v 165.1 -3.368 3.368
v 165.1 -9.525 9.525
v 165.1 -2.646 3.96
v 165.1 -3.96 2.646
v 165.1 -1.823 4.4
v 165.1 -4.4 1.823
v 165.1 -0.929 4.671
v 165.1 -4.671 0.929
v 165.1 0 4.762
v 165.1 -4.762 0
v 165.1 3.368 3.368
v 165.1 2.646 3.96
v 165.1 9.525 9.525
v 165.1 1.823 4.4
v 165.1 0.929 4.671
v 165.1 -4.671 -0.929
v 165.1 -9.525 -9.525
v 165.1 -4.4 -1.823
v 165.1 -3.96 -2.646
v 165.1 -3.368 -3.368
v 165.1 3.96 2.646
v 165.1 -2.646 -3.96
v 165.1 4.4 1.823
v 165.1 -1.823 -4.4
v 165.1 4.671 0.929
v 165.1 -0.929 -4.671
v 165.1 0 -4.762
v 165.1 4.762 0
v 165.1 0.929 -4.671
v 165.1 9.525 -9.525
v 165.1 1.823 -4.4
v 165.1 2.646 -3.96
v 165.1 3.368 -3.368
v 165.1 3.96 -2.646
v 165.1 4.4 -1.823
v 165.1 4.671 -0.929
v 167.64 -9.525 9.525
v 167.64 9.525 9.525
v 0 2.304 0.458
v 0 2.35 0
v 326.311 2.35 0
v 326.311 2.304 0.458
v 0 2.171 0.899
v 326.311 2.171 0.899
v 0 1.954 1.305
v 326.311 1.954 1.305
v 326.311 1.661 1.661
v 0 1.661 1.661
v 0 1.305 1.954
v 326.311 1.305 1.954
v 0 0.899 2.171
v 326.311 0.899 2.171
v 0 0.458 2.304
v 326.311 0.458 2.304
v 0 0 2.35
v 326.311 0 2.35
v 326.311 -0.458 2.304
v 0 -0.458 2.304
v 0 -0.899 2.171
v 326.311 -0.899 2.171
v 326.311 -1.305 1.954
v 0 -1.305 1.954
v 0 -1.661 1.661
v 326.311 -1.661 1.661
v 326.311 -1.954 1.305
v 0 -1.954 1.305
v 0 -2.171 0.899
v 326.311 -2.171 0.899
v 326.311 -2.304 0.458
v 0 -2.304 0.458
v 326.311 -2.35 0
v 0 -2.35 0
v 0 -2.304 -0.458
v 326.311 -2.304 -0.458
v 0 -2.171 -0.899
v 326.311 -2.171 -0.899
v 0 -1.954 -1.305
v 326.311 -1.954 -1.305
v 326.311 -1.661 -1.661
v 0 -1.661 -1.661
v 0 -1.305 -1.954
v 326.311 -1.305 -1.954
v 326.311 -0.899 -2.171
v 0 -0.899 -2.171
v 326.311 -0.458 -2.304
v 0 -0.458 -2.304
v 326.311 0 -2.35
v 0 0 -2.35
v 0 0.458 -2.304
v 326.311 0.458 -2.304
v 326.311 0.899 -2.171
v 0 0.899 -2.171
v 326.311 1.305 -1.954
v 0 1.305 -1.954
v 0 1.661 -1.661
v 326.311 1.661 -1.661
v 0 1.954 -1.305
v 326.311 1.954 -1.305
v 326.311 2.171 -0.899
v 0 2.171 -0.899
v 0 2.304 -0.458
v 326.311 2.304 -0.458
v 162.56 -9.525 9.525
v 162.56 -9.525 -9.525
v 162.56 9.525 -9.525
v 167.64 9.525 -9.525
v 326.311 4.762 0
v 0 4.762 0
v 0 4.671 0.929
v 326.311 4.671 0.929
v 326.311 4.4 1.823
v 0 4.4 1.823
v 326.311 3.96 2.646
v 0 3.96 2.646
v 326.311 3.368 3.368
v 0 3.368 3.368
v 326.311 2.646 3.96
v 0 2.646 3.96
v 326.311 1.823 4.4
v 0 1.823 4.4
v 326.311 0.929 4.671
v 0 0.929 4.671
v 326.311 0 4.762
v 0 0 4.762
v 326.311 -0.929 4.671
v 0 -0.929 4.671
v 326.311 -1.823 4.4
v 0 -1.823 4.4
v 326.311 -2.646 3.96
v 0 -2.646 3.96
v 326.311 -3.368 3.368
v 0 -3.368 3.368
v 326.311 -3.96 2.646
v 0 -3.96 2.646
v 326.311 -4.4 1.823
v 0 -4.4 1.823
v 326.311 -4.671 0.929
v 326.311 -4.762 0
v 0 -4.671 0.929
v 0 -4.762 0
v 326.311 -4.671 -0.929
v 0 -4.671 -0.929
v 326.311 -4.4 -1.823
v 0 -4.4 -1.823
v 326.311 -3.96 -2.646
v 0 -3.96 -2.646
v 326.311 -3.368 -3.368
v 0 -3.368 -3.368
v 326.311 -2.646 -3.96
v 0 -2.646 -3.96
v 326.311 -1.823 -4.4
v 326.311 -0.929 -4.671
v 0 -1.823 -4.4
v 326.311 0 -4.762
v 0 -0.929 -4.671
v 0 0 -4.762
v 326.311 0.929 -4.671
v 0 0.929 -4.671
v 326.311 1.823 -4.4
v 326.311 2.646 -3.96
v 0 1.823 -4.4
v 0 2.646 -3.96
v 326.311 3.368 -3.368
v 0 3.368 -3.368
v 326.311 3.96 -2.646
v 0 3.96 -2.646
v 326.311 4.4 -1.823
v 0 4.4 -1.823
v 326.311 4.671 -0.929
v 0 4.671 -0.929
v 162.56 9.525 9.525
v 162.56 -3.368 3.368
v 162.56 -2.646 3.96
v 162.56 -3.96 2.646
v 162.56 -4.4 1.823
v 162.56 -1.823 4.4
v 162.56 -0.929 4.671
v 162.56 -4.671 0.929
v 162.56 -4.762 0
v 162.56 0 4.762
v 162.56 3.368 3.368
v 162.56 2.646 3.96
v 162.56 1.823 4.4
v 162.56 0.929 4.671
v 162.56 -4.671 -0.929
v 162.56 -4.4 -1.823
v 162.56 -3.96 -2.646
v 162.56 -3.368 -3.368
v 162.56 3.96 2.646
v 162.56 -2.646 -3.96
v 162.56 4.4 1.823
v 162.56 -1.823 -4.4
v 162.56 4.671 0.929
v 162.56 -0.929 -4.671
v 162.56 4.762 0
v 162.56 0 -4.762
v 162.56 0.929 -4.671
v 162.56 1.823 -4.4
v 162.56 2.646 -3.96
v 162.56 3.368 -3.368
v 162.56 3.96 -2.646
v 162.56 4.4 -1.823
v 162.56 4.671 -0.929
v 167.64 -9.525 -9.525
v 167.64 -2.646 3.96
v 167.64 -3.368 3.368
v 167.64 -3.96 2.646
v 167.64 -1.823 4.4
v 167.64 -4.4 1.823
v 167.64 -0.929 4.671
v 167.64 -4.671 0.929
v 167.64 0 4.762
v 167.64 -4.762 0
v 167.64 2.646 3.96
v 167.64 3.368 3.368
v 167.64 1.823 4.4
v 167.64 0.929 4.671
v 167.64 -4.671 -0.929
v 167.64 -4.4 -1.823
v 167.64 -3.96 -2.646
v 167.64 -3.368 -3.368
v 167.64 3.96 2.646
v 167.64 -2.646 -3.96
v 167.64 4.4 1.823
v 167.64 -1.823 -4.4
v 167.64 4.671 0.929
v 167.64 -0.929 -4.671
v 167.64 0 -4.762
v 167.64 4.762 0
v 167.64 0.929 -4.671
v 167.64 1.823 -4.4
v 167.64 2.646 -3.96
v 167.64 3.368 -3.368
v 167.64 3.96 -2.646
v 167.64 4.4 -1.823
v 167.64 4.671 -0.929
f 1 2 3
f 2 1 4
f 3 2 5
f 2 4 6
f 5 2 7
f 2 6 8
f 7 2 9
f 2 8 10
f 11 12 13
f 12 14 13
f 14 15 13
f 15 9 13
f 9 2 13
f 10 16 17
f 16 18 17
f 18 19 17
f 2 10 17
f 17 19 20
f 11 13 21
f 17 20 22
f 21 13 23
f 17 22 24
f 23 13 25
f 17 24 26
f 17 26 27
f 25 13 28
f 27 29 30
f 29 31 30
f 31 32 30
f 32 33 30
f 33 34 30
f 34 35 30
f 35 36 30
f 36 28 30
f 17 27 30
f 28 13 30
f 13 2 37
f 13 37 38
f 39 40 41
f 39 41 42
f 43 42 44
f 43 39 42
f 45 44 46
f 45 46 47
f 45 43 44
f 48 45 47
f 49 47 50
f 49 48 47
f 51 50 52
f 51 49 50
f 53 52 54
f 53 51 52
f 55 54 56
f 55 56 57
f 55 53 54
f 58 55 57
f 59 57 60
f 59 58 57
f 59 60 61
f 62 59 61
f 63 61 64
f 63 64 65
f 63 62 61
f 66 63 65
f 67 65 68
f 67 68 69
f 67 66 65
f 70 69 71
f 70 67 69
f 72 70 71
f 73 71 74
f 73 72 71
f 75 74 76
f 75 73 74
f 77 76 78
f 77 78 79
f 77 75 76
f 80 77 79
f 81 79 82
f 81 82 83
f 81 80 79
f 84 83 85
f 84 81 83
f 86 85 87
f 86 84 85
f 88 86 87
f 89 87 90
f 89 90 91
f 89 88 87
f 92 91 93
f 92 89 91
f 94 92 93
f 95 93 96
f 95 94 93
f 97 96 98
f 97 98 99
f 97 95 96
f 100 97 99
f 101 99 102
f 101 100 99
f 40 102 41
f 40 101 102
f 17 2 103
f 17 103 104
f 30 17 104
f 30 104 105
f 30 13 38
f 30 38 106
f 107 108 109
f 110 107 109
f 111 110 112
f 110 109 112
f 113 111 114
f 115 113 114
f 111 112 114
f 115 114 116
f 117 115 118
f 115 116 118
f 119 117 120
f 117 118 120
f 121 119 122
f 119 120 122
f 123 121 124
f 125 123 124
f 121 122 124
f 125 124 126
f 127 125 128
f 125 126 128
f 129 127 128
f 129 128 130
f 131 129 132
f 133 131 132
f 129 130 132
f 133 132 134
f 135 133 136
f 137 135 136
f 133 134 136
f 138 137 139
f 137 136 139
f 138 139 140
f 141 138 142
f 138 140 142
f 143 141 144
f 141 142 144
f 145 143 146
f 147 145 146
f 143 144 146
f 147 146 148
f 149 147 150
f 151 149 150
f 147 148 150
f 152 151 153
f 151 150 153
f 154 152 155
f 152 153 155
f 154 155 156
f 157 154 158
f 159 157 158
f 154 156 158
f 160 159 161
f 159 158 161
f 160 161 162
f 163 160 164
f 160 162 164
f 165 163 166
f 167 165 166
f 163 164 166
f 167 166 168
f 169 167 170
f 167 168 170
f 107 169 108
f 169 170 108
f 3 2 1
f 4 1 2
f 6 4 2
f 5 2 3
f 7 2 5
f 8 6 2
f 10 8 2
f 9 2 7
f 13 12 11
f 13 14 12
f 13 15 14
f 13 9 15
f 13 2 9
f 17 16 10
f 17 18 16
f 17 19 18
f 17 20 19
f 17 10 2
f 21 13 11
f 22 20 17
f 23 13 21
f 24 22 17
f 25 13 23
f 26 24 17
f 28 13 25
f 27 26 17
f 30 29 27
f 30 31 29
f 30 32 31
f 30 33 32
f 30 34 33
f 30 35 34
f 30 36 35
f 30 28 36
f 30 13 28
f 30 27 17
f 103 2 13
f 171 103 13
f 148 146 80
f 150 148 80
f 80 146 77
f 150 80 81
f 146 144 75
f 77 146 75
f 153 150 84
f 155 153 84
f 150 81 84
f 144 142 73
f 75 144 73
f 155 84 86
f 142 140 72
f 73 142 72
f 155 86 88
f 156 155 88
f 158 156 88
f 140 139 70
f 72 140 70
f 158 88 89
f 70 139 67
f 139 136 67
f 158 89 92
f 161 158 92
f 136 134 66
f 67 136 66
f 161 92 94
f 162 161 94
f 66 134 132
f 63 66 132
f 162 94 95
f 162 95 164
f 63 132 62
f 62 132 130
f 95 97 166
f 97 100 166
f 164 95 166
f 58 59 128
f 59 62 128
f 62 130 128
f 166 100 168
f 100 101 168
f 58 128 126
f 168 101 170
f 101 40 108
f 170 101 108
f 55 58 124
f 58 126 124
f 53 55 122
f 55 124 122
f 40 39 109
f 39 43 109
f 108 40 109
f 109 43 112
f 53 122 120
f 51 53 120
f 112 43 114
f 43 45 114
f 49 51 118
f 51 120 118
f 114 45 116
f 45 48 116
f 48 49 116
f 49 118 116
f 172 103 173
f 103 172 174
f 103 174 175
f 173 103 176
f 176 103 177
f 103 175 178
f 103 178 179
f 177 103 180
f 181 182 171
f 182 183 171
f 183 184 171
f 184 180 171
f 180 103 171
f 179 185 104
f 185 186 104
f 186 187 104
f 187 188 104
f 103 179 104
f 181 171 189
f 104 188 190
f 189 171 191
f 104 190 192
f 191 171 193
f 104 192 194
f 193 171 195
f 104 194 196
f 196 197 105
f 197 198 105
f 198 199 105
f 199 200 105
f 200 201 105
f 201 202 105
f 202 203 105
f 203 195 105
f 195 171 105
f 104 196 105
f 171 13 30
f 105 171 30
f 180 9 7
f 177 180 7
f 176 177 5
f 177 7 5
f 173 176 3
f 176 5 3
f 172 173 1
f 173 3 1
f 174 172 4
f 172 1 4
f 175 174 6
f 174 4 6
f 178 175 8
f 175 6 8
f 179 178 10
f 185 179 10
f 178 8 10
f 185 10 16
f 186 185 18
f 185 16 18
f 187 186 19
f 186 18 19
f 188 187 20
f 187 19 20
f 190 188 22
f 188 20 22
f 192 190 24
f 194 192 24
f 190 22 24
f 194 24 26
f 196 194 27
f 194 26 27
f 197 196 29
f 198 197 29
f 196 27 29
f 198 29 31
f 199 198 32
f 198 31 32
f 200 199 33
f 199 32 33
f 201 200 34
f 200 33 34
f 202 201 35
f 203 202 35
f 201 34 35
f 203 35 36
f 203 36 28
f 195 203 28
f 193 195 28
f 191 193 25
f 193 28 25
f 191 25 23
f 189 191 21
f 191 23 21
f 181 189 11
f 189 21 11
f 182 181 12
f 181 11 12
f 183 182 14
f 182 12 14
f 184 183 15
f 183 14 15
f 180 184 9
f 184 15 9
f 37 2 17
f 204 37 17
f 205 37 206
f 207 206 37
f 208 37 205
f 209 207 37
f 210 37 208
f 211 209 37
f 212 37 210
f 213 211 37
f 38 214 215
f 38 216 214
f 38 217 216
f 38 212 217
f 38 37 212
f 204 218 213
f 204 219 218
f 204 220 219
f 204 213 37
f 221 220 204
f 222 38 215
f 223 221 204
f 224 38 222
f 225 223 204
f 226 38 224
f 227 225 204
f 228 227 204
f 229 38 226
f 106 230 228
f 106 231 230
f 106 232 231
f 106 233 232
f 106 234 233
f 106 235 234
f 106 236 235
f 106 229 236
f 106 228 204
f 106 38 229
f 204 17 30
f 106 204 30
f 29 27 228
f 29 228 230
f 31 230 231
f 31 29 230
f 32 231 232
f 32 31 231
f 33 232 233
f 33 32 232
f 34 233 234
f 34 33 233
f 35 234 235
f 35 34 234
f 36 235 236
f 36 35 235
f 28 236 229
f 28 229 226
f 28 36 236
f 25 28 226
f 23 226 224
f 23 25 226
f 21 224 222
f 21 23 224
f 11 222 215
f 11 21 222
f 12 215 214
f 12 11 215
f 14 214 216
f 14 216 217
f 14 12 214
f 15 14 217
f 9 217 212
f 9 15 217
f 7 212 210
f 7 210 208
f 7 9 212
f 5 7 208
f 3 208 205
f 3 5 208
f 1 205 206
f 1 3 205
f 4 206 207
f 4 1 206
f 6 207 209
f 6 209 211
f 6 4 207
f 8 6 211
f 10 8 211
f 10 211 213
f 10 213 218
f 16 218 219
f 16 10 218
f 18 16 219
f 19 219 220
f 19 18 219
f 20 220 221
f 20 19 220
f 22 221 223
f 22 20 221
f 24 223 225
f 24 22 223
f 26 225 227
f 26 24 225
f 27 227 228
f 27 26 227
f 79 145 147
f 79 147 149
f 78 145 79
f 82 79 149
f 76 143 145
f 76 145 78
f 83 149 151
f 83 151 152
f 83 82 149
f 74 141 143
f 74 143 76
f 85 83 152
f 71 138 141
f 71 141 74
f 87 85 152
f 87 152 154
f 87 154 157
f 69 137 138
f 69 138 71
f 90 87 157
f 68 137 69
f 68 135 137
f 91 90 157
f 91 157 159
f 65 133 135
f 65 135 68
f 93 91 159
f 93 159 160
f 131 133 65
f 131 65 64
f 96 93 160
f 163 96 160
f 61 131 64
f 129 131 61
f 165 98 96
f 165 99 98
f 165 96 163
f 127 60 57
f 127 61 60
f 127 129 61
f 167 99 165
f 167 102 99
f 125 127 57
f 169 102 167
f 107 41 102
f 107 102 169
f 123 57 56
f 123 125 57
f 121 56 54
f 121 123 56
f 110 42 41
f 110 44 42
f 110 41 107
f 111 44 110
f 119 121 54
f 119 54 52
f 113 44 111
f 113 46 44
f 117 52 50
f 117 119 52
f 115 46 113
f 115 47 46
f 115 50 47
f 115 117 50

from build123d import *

# Parameters (mm, degrees)
SKETCH1_R                 = 4.7625
SKETCH1_R_2               = 2.3495
STEERING_ROD_MEMBER_DEPTH = 326.310830854
STEERING_START            = 165.1
SKETCH2_W                 = 19.05
SKETCH2_H                 = 19.05
SKETCH2_R                 = 4.7625
STEERING_ROD_NUT_1_DEPTH  = 2.54
SKETCH3_W                 = 19.05
SKETCH3_H                 = 19.05
SKETCH3_R                 = 4.7625
STEERING_ROD_NUT_2_DEPTH  = 2.54


with BuildPart() as part:
    # Sketch1 → Steering Rod Member (new body)
    with BuildSketch(Plane.YZ):
        Circle(SKETCH1_R)
        Circle(SKETCH1_R_2, mode=Mode.SUBTRACT)
    extrude(amount=STEERING_ROD_MEMBER_DEPTH)


with BuildPart() as body_2:
    # Sketch2 → Steering Rod Nut 1 (new body)
    with BuildSketch(Plane(origin=(0, 0, 0), x_dir=(0, 0, -1), z_dir=(1, 0, 0)).offset(STEERING_START)):
        Rectangle(SKETCH2_W, SKETCH2_H)
        Circle(SKETCH2_R, mode=Mode.SUBTRACT)
    extrude(amount=STEERING_ROD_NUT_1_DEPTH)


with BuildPart() as body_3:
    # Sketch3 → Steering Rod Nut 2 (new body)
    with BuildSketch(Plane(origin=(0, 0, 0), x_dir=(0, 0, -1), z_dir=(1, 0, 0)).offset(STEERING_START)):
        Rectangle(SKETCH3_W, SKETCH3_H)
        with Locations(Location((0, 0, 0), (0, 0, 180))):
            Circle(SKETCH3_R, mode=Mode.SUBTRACT)
    extrude(amount=-STEERING_ROD_NUT_2_DEPTH)


solid = Compound([part.part, body_2.part, body_3.part])
